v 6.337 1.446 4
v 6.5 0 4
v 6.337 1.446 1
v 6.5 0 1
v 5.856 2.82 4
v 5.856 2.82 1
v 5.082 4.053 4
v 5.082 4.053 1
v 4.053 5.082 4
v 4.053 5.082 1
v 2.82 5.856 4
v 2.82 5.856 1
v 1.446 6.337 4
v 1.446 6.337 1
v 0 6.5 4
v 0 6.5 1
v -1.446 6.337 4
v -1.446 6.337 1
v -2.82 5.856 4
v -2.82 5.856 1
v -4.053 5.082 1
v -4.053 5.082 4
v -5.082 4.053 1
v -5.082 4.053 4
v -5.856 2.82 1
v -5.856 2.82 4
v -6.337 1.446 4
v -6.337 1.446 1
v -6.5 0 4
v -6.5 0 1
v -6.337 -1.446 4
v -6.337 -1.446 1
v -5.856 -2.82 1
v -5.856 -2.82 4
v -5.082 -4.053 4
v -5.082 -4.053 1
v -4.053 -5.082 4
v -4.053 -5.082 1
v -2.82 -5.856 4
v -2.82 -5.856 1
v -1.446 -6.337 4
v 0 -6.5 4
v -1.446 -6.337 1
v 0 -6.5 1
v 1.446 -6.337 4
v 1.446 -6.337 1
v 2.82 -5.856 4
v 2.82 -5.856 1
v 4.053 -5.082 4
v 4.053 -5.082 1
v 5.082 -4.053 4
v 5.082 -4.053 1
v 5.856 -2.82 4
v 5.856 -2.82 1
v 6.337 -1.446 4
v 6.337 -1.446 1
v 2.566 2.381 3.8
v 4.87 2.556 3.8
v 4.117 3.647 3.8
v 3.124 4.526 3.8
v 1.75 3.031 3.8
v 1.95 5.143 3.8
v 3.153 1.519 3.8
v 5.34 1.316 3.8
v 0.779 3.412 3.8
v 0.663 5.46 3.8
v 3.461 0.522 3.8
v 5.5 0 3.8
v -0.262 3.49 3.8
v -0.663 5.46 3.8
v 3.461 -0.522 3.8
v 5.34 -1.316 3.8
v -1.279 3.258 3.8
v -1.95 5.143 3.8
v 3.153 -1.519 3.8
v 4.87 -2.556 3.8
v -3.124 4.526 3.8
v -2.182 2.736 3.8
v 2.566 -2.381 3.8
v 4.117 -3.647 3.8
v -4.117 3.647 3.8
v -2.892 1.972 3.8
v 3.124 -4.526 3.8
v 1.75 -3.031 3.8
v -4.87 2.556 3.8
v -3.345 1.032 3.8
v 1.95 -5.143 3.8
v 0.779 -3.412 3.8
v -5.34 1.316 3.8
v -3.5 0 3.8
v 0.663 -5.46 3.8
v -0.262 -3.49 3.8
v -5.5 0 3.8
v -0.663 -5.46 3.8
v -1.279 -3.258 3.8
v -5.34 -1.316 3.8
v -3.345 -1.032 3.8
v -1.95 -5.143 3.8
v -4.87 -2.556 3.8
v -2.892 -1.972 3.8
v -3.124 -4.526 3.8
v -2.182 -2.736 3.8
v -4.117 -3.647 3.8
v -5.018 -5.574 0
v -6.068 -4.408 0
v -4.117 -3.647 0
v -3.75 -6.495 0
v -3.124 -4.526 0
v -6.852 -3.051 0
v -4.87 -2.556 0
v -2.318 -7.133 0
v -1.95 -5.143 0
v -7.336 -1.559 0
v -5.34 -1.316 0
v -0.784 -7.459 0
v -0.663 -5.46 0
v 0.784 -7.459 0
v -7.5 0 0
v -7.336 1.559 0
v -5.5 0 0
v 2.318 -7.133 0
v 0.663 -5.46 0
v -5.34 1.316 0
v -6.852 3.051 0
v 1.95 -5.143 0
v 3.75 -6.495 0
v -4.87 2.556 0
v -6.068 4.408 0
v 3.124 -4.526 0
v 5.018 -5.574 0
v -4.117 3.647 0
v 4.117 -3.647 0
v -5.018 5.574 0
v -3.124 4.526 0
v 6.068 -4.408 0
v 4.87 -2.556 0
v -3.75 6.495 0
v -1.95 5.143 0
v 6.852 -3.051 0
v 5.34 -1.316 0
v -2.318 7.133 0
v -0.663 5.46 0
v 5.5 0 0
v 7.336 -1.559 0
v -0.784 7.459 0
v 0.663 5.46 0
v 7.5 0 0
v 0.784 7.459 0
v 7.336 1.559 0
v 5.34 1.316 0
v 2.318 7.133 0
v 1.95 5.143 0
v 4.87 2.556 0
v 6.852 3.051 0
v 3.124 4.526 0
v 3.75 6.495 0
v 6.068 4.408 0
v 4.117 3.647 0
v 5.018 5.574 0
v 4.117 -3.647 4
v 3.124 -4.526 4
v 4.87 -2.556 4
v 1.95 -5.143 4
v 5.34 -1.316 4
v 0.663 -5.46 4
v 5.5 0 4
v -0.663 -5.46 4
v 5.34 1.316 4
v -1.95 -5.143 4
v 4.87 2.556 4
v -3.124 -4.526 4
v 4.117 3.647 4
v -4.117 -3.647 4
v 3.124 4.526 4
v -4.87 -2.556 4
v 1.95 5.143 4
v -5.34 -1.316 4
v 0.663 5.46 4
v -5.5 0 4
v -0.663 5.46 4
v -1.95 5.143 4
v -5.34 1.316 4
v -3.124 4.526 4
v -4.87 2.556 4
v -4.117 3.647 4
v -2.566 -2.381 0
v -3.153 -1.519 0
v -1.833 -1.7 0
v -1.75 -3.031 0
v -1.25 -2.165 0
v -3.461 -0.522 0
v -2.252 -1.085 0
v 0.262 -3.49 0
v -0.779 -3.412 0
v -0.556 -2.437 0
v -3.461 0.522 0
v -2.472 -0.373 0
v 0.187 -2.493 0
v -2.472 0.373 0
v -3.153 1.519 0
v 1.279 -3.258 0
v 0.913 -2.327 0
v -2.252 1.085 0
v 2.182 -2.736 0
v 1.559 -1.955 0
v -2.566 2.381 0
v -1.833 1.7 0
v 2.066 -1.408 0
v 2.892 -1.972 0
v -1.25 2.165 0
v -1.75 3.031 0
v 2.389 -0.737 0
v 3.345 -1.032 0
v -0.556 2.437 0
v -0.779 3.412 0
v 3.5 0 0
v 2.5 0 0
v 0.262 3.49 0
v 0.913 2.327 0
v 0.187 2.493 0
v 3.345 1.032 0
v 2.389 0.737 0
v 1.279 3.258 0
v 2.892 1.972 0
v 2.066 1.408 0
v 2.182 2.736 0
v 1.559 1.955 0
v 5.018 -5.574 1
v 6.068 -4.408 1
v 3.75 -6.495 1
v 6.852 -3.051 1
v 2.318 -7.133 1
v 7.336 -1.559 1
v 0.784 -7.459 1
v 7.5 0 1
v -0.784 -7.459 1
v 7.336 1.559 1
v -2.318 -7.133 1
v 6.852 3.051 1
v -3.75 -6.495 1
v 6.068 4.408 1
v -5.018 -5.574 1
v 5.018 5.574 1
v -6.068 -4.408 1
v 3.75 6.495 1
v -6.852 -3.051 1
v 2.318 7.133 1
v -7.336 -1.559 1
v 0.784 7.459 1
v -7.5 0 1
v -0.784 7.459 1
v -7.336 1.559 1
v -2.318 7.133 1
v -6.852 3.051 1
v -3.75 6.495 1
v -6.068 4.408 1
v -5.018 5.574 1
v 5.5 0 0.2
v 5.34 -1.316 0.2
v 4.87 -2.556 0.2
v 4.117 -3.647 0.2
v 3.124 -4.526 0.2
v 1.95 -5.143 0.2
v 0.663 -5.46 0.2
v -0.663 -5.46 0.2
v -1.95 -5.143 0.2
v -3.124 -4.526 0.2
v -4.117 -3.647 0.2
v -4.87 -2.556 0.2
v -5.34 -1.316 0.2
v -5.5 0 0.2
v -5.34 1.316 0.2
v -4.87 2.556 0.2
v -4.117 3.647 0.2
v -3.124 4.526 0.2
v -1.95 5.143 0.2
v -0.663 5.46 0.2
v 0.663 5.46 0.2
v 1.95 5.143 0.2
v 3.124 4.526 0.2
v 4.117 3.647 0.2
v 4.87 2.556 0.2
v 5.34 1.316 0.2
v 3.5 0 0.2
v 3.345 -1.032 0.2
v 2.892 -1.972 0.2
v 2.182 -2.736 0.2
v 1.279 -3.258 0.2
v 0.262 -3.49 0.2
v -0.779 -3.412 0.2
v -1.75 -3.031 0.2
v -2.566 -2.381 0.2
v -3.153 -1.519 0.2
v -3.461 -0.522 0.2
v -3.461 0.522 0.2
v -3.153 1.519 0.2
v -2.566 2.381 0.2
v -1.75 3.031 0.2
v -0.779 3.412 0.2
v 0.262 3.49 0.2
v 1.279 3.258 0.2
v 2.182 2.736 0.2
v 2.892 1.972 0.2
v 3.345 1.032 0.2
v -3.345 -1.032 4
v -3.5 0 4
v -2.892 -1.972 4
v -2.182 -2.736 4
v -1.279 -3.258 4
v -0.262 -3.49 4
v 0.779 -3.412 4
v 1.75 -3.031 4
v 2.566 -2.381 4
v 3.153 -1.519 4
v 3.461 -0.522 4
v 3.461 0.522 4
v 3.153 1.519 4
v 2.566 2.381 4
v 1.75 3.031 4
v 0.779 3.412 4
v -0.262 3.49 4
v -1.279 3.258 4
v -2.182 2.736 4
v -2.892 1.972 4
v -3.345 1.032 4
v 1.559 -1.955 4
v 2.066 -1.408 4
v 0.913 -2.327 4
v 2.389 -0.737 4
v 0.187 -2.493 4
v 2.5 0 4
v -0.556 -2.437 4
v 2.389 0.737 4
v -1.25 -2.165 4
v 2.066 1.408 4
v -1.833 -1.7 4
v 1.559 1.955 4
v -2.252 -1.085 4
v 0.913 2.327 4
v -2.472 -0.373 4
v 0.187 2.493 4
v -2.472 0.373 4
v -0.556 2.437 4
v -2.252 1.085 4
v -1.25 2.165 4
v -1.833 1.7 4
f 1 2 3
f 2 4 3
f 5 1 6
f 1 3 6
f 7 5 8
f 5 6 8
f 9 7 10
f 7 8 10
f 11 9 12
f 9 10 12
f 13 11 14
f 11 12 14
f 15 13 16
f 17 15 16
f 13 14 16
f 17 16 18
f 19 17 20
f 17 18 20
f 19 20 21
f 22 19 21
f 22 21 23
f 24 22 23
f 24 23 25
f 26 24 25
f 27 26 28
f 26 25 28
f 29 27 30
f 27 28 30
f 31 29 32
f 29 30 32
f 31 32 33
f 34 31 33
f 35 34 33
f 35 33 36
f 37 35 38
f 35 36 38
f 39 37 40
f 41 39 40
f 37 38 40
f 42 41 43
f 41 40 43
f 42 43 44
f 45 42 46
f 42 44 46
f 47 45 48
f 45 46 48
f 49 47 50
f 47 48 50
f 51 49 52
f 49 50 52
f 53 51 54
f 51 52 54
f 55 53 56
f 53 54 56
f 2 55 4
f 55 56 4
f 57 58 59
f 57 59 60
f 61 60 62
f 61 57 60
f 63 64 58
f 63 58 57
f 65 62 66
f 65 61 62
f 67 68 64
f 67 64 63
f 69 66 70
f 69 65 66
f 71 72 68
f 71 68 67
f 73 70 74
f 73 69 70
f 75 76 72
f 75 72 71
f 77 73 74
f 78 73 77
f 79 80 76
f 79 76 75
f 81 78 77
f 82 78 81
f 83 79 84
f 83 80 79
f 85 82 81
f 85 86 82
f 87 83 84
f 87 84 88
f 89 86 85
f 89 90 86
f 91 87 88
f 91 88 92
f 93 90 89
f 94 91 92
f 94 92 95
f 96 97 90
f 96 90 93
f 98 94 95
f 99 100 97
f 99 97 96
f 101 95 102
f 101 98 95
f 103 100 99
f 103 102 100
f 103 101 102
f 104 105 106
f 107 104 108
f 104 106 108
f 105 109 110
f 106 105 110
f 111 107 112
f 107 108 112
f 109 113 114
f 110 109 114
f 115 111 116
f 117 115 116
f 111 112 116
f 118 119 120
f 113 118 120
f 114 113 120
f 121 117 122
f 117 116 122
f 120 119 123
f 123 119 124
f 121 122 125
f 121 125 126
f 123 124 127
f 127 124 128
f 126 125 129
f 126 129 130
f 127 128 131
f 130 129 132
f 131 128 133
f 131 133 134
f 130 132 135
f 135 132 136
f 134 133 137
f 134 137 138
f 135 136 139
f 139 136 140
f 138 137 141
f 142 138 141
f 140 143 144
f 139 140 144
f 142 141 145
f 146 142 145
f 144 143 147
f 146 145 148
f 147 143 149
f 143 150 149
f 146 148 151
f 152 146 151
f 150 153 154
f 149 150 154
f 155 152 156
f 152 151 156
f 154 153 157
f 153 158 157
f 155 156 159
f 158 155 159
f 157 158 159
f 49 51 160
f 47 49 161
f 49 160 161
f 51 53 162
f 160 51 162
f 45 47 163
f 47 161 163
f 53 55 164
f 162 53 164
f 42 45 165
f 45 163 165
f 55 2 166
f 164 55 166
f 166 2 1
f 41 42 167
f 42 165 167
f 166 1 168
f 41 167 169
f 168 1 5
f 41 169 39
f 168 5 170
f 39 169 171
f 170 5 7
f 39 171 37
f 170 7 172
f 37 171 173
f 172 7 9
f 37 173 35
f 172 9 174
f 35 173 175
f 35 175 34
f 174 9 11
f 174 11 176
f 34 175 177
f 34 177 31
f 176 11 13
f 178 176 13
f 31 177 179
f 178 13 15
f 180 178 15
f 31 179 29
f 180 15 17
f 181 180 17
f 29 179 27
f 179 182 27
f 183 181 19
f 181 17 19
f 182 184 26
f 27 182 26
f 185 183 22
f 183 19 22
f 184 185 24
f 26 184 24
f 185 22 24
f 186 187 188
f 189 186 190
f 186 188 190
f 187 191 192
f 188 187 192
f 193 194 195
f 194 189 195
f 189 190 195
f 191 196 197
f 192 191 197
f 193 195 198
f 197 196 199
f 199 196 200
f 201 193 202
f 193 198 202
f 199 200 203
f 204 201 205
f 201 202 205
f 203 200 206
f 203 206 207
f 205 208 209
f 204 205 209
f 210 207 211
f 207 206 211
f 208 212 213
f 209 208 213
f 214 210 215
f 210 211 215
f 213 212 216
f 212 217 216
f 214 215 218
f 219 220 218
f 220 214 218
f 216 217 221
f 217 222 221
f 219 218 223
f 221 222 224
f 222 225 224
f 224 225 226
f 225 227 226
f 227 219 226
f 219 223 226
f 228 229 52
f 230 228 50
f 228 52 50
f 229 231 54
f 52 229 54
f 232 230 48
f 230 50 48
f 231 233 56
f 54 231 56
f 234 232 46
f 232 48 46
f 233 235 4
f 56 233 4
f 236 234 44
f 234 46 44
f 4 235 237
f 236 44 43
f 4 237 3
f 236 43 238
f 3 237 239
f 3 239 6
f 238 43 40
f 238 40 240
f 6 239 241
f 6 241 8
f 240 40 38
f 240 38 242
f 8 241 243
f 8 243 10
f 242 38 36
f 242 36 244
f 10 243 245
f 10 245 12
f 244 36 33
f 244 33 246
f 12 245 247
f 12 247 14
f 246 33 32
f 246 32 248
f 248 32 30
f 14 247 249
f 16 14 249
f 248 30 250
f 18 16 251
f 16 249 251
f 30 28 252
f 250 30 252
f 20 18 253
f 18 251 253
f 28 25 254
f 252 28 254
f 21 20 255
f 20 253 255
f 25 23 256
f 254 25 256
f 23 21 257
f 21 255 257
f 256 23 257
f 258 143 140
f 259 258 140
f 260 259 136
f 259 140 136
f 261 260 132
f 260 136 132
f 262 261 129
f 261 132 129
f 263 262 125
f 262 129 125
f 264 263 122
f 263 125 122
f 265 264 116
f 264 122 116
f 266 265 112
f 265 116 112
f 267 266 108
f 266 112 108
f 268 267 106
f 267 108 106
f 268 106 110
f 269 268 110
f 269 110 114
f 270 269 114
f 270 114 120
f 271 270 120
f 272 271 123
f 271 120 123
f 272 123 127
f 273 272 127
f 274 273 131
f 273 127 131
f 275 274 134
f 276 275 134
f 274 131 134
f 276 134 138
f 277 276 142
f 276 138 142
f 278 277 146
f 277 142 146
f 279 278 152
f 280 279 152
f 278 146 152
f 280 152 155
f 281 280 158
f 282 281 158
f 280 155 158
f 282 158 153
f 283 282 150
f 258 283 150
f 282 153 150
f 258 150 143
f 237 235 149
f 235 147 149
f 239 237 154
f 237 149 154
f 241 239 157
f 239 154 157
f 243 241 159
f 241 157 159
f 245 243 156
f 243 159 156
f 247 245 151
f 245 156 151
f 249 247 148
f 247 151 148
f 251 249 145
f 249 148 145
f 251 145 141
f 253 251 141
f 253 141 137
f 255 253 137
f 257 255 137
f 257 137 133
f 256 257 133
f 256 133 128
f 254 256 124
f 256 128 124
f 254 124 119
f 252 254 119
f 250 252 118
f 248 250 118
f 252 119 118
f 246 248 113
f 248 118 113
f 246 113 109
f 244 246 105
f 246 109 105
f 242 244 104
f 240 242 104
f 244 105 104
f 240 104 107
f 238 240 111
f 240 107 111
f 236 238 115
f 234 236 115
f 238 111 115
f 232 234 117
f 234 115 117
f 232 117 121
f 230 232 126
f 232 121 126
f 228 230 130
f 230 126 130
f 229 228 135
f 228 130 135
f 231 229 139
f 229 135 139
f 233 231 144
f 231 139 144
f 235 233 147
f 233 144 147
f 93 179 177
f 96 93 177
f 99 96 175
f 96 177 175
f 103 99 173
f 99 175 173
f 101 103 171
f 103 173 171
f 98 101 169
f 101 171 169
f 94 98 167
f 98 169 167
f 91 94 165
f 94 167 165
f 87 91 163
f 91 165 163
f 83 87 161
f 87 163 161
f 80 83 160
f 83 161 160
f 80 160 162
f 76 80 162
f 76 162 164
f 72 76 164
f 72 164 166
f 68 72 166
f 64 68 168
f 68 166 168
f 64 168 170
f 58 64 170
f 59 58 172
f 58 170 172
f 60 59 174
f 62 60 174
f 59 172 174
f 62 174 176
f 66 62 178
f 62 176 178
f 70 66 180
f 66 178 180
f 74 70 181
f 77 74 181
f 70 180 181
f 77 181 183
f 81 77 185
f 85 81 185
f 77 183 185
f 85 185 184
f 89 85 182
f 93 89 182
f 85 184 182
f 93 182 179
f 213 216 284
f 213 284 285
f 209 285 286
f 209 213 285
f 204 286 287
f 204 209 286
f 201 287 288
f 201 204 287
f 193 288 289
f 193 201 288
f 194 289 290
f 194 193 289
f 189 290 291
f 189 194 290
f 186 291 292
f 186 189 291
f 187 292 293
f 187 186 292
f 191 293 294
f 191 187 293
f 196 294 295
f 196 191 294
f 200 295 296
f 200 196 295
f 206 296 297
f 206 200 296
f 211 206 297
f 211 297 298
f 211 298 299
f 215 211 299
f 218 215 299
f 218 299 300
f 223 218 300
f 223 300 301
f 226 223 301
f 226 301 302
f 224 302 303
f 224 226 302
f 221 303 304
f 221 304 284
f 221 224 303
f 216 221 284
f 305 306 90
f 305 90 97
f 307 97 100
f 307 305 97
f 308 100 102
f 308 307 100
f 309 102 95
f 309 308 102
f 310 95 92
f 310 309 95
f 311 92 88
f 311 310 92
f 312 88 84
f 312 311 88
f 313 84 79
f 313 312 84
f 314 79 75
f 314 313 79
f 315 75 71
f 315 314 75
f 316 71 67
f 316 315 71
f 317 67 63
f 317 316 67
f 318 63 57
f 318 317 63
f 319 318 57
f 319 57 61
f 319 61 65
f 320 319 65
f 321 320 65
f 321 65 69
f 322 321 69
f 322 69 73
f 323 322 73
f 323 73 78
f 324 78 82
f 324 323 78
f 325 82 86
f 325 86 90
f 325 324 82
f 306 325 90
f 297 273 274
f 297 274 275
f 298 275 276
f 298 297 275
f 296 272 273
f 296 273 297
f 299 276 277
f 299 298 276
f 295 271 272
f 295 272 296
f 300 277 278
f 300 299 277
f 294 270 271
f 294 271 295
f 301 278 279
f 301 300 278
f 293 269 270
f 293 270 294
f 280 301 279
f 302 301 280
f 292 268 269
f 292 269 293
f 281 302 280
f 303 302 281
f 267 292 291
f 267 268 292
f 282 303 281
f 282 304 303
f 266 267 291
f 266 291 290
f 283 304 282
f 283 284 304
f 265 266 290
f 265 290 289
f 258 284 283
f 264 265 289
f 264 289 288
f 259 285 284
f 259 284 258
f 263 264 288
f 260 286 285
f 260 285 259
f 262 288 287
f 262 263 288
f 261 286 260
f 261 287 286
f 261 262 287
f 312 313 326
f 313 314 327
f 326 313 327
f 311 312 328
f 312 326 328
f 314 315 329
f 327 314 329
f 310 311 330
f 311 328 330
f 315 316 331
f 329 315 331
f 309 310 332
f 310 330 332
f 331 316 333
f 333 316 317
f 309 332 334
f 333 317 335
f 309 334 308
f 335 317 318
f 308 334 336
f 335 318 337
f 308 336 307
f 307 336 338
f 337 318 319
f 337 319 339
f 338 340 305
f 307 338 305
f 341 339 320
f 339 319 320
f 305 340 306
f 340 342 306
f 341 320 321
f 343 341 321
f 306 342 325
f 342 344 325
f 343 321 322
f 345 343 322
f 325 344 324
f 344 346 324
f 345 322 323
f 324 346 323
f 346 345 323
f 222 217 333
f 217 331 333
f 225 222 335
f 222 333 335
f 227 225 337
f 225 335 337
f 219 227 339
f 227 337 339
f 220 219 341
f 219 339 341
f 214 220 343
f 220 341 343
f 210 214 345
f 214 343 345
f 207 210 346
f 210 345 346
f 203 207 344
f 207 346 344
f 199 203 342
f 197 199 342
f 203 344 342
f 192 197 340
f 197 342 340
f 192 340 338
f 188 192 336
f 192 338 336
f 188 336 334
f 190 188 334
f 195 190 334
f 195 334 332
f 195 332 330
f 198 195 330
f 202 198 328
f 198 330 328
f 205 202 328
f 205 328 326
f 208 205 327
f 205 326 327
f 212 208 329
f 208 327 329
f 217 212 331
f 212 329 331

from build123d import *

# Parameters (mm, degrees)
SKETCH001_R     = 5.5
SKETCH001_R_2   = 3.5
POCKET_DEPTH    = 0.2
SKETCH002_R     = 5.5
SKETCH002_R_2   = 3.5
POCKET001_DEPTH = 0.2


with BuildPart() as part:
    # Sketch → Revolution (revolve)
    with BuildSketch(Plane.XZ):
        Polygon((2.5, 4), (6.5, 4), (6.5, 1), (7.5, 1), (7.5, 0), (2.5, 0), align=None)
    revolve(axis=Axis((0, 0, 0), (0, 0, 1)))

    # Sketch001 (on Face1 of Revolution) → Pocket (cut)
    with BuildSketch(Plane(origin=(0, 0, 4), x_dir=(-1, 0, 0), z_dir=(0, 0, 1))):
        Circle(SKETCH001_R)
        Circle(SKETCH001_R_2, mode=Mode.SUBTRACT)
    extrude(amount=-POCKET_DEPTH, mode=Mode.SUBTRACT)

    # Sketch002 (on Face8 of Pocket) → Pocket001 (cut)
    with BuildSketch(Plane(origin=(0, 0, 0), x_dir=(1, 0, 0), z_dir=(0, 0, -1))):
        Circle(SKETCH002_R)
        Circle(SKETCH002_R_2, mode=Mode.SUBTRACT)
    extrude(amount=-POCKET001_DEPTH, mode=Mode.SUBTRACT)


solid = part.part
